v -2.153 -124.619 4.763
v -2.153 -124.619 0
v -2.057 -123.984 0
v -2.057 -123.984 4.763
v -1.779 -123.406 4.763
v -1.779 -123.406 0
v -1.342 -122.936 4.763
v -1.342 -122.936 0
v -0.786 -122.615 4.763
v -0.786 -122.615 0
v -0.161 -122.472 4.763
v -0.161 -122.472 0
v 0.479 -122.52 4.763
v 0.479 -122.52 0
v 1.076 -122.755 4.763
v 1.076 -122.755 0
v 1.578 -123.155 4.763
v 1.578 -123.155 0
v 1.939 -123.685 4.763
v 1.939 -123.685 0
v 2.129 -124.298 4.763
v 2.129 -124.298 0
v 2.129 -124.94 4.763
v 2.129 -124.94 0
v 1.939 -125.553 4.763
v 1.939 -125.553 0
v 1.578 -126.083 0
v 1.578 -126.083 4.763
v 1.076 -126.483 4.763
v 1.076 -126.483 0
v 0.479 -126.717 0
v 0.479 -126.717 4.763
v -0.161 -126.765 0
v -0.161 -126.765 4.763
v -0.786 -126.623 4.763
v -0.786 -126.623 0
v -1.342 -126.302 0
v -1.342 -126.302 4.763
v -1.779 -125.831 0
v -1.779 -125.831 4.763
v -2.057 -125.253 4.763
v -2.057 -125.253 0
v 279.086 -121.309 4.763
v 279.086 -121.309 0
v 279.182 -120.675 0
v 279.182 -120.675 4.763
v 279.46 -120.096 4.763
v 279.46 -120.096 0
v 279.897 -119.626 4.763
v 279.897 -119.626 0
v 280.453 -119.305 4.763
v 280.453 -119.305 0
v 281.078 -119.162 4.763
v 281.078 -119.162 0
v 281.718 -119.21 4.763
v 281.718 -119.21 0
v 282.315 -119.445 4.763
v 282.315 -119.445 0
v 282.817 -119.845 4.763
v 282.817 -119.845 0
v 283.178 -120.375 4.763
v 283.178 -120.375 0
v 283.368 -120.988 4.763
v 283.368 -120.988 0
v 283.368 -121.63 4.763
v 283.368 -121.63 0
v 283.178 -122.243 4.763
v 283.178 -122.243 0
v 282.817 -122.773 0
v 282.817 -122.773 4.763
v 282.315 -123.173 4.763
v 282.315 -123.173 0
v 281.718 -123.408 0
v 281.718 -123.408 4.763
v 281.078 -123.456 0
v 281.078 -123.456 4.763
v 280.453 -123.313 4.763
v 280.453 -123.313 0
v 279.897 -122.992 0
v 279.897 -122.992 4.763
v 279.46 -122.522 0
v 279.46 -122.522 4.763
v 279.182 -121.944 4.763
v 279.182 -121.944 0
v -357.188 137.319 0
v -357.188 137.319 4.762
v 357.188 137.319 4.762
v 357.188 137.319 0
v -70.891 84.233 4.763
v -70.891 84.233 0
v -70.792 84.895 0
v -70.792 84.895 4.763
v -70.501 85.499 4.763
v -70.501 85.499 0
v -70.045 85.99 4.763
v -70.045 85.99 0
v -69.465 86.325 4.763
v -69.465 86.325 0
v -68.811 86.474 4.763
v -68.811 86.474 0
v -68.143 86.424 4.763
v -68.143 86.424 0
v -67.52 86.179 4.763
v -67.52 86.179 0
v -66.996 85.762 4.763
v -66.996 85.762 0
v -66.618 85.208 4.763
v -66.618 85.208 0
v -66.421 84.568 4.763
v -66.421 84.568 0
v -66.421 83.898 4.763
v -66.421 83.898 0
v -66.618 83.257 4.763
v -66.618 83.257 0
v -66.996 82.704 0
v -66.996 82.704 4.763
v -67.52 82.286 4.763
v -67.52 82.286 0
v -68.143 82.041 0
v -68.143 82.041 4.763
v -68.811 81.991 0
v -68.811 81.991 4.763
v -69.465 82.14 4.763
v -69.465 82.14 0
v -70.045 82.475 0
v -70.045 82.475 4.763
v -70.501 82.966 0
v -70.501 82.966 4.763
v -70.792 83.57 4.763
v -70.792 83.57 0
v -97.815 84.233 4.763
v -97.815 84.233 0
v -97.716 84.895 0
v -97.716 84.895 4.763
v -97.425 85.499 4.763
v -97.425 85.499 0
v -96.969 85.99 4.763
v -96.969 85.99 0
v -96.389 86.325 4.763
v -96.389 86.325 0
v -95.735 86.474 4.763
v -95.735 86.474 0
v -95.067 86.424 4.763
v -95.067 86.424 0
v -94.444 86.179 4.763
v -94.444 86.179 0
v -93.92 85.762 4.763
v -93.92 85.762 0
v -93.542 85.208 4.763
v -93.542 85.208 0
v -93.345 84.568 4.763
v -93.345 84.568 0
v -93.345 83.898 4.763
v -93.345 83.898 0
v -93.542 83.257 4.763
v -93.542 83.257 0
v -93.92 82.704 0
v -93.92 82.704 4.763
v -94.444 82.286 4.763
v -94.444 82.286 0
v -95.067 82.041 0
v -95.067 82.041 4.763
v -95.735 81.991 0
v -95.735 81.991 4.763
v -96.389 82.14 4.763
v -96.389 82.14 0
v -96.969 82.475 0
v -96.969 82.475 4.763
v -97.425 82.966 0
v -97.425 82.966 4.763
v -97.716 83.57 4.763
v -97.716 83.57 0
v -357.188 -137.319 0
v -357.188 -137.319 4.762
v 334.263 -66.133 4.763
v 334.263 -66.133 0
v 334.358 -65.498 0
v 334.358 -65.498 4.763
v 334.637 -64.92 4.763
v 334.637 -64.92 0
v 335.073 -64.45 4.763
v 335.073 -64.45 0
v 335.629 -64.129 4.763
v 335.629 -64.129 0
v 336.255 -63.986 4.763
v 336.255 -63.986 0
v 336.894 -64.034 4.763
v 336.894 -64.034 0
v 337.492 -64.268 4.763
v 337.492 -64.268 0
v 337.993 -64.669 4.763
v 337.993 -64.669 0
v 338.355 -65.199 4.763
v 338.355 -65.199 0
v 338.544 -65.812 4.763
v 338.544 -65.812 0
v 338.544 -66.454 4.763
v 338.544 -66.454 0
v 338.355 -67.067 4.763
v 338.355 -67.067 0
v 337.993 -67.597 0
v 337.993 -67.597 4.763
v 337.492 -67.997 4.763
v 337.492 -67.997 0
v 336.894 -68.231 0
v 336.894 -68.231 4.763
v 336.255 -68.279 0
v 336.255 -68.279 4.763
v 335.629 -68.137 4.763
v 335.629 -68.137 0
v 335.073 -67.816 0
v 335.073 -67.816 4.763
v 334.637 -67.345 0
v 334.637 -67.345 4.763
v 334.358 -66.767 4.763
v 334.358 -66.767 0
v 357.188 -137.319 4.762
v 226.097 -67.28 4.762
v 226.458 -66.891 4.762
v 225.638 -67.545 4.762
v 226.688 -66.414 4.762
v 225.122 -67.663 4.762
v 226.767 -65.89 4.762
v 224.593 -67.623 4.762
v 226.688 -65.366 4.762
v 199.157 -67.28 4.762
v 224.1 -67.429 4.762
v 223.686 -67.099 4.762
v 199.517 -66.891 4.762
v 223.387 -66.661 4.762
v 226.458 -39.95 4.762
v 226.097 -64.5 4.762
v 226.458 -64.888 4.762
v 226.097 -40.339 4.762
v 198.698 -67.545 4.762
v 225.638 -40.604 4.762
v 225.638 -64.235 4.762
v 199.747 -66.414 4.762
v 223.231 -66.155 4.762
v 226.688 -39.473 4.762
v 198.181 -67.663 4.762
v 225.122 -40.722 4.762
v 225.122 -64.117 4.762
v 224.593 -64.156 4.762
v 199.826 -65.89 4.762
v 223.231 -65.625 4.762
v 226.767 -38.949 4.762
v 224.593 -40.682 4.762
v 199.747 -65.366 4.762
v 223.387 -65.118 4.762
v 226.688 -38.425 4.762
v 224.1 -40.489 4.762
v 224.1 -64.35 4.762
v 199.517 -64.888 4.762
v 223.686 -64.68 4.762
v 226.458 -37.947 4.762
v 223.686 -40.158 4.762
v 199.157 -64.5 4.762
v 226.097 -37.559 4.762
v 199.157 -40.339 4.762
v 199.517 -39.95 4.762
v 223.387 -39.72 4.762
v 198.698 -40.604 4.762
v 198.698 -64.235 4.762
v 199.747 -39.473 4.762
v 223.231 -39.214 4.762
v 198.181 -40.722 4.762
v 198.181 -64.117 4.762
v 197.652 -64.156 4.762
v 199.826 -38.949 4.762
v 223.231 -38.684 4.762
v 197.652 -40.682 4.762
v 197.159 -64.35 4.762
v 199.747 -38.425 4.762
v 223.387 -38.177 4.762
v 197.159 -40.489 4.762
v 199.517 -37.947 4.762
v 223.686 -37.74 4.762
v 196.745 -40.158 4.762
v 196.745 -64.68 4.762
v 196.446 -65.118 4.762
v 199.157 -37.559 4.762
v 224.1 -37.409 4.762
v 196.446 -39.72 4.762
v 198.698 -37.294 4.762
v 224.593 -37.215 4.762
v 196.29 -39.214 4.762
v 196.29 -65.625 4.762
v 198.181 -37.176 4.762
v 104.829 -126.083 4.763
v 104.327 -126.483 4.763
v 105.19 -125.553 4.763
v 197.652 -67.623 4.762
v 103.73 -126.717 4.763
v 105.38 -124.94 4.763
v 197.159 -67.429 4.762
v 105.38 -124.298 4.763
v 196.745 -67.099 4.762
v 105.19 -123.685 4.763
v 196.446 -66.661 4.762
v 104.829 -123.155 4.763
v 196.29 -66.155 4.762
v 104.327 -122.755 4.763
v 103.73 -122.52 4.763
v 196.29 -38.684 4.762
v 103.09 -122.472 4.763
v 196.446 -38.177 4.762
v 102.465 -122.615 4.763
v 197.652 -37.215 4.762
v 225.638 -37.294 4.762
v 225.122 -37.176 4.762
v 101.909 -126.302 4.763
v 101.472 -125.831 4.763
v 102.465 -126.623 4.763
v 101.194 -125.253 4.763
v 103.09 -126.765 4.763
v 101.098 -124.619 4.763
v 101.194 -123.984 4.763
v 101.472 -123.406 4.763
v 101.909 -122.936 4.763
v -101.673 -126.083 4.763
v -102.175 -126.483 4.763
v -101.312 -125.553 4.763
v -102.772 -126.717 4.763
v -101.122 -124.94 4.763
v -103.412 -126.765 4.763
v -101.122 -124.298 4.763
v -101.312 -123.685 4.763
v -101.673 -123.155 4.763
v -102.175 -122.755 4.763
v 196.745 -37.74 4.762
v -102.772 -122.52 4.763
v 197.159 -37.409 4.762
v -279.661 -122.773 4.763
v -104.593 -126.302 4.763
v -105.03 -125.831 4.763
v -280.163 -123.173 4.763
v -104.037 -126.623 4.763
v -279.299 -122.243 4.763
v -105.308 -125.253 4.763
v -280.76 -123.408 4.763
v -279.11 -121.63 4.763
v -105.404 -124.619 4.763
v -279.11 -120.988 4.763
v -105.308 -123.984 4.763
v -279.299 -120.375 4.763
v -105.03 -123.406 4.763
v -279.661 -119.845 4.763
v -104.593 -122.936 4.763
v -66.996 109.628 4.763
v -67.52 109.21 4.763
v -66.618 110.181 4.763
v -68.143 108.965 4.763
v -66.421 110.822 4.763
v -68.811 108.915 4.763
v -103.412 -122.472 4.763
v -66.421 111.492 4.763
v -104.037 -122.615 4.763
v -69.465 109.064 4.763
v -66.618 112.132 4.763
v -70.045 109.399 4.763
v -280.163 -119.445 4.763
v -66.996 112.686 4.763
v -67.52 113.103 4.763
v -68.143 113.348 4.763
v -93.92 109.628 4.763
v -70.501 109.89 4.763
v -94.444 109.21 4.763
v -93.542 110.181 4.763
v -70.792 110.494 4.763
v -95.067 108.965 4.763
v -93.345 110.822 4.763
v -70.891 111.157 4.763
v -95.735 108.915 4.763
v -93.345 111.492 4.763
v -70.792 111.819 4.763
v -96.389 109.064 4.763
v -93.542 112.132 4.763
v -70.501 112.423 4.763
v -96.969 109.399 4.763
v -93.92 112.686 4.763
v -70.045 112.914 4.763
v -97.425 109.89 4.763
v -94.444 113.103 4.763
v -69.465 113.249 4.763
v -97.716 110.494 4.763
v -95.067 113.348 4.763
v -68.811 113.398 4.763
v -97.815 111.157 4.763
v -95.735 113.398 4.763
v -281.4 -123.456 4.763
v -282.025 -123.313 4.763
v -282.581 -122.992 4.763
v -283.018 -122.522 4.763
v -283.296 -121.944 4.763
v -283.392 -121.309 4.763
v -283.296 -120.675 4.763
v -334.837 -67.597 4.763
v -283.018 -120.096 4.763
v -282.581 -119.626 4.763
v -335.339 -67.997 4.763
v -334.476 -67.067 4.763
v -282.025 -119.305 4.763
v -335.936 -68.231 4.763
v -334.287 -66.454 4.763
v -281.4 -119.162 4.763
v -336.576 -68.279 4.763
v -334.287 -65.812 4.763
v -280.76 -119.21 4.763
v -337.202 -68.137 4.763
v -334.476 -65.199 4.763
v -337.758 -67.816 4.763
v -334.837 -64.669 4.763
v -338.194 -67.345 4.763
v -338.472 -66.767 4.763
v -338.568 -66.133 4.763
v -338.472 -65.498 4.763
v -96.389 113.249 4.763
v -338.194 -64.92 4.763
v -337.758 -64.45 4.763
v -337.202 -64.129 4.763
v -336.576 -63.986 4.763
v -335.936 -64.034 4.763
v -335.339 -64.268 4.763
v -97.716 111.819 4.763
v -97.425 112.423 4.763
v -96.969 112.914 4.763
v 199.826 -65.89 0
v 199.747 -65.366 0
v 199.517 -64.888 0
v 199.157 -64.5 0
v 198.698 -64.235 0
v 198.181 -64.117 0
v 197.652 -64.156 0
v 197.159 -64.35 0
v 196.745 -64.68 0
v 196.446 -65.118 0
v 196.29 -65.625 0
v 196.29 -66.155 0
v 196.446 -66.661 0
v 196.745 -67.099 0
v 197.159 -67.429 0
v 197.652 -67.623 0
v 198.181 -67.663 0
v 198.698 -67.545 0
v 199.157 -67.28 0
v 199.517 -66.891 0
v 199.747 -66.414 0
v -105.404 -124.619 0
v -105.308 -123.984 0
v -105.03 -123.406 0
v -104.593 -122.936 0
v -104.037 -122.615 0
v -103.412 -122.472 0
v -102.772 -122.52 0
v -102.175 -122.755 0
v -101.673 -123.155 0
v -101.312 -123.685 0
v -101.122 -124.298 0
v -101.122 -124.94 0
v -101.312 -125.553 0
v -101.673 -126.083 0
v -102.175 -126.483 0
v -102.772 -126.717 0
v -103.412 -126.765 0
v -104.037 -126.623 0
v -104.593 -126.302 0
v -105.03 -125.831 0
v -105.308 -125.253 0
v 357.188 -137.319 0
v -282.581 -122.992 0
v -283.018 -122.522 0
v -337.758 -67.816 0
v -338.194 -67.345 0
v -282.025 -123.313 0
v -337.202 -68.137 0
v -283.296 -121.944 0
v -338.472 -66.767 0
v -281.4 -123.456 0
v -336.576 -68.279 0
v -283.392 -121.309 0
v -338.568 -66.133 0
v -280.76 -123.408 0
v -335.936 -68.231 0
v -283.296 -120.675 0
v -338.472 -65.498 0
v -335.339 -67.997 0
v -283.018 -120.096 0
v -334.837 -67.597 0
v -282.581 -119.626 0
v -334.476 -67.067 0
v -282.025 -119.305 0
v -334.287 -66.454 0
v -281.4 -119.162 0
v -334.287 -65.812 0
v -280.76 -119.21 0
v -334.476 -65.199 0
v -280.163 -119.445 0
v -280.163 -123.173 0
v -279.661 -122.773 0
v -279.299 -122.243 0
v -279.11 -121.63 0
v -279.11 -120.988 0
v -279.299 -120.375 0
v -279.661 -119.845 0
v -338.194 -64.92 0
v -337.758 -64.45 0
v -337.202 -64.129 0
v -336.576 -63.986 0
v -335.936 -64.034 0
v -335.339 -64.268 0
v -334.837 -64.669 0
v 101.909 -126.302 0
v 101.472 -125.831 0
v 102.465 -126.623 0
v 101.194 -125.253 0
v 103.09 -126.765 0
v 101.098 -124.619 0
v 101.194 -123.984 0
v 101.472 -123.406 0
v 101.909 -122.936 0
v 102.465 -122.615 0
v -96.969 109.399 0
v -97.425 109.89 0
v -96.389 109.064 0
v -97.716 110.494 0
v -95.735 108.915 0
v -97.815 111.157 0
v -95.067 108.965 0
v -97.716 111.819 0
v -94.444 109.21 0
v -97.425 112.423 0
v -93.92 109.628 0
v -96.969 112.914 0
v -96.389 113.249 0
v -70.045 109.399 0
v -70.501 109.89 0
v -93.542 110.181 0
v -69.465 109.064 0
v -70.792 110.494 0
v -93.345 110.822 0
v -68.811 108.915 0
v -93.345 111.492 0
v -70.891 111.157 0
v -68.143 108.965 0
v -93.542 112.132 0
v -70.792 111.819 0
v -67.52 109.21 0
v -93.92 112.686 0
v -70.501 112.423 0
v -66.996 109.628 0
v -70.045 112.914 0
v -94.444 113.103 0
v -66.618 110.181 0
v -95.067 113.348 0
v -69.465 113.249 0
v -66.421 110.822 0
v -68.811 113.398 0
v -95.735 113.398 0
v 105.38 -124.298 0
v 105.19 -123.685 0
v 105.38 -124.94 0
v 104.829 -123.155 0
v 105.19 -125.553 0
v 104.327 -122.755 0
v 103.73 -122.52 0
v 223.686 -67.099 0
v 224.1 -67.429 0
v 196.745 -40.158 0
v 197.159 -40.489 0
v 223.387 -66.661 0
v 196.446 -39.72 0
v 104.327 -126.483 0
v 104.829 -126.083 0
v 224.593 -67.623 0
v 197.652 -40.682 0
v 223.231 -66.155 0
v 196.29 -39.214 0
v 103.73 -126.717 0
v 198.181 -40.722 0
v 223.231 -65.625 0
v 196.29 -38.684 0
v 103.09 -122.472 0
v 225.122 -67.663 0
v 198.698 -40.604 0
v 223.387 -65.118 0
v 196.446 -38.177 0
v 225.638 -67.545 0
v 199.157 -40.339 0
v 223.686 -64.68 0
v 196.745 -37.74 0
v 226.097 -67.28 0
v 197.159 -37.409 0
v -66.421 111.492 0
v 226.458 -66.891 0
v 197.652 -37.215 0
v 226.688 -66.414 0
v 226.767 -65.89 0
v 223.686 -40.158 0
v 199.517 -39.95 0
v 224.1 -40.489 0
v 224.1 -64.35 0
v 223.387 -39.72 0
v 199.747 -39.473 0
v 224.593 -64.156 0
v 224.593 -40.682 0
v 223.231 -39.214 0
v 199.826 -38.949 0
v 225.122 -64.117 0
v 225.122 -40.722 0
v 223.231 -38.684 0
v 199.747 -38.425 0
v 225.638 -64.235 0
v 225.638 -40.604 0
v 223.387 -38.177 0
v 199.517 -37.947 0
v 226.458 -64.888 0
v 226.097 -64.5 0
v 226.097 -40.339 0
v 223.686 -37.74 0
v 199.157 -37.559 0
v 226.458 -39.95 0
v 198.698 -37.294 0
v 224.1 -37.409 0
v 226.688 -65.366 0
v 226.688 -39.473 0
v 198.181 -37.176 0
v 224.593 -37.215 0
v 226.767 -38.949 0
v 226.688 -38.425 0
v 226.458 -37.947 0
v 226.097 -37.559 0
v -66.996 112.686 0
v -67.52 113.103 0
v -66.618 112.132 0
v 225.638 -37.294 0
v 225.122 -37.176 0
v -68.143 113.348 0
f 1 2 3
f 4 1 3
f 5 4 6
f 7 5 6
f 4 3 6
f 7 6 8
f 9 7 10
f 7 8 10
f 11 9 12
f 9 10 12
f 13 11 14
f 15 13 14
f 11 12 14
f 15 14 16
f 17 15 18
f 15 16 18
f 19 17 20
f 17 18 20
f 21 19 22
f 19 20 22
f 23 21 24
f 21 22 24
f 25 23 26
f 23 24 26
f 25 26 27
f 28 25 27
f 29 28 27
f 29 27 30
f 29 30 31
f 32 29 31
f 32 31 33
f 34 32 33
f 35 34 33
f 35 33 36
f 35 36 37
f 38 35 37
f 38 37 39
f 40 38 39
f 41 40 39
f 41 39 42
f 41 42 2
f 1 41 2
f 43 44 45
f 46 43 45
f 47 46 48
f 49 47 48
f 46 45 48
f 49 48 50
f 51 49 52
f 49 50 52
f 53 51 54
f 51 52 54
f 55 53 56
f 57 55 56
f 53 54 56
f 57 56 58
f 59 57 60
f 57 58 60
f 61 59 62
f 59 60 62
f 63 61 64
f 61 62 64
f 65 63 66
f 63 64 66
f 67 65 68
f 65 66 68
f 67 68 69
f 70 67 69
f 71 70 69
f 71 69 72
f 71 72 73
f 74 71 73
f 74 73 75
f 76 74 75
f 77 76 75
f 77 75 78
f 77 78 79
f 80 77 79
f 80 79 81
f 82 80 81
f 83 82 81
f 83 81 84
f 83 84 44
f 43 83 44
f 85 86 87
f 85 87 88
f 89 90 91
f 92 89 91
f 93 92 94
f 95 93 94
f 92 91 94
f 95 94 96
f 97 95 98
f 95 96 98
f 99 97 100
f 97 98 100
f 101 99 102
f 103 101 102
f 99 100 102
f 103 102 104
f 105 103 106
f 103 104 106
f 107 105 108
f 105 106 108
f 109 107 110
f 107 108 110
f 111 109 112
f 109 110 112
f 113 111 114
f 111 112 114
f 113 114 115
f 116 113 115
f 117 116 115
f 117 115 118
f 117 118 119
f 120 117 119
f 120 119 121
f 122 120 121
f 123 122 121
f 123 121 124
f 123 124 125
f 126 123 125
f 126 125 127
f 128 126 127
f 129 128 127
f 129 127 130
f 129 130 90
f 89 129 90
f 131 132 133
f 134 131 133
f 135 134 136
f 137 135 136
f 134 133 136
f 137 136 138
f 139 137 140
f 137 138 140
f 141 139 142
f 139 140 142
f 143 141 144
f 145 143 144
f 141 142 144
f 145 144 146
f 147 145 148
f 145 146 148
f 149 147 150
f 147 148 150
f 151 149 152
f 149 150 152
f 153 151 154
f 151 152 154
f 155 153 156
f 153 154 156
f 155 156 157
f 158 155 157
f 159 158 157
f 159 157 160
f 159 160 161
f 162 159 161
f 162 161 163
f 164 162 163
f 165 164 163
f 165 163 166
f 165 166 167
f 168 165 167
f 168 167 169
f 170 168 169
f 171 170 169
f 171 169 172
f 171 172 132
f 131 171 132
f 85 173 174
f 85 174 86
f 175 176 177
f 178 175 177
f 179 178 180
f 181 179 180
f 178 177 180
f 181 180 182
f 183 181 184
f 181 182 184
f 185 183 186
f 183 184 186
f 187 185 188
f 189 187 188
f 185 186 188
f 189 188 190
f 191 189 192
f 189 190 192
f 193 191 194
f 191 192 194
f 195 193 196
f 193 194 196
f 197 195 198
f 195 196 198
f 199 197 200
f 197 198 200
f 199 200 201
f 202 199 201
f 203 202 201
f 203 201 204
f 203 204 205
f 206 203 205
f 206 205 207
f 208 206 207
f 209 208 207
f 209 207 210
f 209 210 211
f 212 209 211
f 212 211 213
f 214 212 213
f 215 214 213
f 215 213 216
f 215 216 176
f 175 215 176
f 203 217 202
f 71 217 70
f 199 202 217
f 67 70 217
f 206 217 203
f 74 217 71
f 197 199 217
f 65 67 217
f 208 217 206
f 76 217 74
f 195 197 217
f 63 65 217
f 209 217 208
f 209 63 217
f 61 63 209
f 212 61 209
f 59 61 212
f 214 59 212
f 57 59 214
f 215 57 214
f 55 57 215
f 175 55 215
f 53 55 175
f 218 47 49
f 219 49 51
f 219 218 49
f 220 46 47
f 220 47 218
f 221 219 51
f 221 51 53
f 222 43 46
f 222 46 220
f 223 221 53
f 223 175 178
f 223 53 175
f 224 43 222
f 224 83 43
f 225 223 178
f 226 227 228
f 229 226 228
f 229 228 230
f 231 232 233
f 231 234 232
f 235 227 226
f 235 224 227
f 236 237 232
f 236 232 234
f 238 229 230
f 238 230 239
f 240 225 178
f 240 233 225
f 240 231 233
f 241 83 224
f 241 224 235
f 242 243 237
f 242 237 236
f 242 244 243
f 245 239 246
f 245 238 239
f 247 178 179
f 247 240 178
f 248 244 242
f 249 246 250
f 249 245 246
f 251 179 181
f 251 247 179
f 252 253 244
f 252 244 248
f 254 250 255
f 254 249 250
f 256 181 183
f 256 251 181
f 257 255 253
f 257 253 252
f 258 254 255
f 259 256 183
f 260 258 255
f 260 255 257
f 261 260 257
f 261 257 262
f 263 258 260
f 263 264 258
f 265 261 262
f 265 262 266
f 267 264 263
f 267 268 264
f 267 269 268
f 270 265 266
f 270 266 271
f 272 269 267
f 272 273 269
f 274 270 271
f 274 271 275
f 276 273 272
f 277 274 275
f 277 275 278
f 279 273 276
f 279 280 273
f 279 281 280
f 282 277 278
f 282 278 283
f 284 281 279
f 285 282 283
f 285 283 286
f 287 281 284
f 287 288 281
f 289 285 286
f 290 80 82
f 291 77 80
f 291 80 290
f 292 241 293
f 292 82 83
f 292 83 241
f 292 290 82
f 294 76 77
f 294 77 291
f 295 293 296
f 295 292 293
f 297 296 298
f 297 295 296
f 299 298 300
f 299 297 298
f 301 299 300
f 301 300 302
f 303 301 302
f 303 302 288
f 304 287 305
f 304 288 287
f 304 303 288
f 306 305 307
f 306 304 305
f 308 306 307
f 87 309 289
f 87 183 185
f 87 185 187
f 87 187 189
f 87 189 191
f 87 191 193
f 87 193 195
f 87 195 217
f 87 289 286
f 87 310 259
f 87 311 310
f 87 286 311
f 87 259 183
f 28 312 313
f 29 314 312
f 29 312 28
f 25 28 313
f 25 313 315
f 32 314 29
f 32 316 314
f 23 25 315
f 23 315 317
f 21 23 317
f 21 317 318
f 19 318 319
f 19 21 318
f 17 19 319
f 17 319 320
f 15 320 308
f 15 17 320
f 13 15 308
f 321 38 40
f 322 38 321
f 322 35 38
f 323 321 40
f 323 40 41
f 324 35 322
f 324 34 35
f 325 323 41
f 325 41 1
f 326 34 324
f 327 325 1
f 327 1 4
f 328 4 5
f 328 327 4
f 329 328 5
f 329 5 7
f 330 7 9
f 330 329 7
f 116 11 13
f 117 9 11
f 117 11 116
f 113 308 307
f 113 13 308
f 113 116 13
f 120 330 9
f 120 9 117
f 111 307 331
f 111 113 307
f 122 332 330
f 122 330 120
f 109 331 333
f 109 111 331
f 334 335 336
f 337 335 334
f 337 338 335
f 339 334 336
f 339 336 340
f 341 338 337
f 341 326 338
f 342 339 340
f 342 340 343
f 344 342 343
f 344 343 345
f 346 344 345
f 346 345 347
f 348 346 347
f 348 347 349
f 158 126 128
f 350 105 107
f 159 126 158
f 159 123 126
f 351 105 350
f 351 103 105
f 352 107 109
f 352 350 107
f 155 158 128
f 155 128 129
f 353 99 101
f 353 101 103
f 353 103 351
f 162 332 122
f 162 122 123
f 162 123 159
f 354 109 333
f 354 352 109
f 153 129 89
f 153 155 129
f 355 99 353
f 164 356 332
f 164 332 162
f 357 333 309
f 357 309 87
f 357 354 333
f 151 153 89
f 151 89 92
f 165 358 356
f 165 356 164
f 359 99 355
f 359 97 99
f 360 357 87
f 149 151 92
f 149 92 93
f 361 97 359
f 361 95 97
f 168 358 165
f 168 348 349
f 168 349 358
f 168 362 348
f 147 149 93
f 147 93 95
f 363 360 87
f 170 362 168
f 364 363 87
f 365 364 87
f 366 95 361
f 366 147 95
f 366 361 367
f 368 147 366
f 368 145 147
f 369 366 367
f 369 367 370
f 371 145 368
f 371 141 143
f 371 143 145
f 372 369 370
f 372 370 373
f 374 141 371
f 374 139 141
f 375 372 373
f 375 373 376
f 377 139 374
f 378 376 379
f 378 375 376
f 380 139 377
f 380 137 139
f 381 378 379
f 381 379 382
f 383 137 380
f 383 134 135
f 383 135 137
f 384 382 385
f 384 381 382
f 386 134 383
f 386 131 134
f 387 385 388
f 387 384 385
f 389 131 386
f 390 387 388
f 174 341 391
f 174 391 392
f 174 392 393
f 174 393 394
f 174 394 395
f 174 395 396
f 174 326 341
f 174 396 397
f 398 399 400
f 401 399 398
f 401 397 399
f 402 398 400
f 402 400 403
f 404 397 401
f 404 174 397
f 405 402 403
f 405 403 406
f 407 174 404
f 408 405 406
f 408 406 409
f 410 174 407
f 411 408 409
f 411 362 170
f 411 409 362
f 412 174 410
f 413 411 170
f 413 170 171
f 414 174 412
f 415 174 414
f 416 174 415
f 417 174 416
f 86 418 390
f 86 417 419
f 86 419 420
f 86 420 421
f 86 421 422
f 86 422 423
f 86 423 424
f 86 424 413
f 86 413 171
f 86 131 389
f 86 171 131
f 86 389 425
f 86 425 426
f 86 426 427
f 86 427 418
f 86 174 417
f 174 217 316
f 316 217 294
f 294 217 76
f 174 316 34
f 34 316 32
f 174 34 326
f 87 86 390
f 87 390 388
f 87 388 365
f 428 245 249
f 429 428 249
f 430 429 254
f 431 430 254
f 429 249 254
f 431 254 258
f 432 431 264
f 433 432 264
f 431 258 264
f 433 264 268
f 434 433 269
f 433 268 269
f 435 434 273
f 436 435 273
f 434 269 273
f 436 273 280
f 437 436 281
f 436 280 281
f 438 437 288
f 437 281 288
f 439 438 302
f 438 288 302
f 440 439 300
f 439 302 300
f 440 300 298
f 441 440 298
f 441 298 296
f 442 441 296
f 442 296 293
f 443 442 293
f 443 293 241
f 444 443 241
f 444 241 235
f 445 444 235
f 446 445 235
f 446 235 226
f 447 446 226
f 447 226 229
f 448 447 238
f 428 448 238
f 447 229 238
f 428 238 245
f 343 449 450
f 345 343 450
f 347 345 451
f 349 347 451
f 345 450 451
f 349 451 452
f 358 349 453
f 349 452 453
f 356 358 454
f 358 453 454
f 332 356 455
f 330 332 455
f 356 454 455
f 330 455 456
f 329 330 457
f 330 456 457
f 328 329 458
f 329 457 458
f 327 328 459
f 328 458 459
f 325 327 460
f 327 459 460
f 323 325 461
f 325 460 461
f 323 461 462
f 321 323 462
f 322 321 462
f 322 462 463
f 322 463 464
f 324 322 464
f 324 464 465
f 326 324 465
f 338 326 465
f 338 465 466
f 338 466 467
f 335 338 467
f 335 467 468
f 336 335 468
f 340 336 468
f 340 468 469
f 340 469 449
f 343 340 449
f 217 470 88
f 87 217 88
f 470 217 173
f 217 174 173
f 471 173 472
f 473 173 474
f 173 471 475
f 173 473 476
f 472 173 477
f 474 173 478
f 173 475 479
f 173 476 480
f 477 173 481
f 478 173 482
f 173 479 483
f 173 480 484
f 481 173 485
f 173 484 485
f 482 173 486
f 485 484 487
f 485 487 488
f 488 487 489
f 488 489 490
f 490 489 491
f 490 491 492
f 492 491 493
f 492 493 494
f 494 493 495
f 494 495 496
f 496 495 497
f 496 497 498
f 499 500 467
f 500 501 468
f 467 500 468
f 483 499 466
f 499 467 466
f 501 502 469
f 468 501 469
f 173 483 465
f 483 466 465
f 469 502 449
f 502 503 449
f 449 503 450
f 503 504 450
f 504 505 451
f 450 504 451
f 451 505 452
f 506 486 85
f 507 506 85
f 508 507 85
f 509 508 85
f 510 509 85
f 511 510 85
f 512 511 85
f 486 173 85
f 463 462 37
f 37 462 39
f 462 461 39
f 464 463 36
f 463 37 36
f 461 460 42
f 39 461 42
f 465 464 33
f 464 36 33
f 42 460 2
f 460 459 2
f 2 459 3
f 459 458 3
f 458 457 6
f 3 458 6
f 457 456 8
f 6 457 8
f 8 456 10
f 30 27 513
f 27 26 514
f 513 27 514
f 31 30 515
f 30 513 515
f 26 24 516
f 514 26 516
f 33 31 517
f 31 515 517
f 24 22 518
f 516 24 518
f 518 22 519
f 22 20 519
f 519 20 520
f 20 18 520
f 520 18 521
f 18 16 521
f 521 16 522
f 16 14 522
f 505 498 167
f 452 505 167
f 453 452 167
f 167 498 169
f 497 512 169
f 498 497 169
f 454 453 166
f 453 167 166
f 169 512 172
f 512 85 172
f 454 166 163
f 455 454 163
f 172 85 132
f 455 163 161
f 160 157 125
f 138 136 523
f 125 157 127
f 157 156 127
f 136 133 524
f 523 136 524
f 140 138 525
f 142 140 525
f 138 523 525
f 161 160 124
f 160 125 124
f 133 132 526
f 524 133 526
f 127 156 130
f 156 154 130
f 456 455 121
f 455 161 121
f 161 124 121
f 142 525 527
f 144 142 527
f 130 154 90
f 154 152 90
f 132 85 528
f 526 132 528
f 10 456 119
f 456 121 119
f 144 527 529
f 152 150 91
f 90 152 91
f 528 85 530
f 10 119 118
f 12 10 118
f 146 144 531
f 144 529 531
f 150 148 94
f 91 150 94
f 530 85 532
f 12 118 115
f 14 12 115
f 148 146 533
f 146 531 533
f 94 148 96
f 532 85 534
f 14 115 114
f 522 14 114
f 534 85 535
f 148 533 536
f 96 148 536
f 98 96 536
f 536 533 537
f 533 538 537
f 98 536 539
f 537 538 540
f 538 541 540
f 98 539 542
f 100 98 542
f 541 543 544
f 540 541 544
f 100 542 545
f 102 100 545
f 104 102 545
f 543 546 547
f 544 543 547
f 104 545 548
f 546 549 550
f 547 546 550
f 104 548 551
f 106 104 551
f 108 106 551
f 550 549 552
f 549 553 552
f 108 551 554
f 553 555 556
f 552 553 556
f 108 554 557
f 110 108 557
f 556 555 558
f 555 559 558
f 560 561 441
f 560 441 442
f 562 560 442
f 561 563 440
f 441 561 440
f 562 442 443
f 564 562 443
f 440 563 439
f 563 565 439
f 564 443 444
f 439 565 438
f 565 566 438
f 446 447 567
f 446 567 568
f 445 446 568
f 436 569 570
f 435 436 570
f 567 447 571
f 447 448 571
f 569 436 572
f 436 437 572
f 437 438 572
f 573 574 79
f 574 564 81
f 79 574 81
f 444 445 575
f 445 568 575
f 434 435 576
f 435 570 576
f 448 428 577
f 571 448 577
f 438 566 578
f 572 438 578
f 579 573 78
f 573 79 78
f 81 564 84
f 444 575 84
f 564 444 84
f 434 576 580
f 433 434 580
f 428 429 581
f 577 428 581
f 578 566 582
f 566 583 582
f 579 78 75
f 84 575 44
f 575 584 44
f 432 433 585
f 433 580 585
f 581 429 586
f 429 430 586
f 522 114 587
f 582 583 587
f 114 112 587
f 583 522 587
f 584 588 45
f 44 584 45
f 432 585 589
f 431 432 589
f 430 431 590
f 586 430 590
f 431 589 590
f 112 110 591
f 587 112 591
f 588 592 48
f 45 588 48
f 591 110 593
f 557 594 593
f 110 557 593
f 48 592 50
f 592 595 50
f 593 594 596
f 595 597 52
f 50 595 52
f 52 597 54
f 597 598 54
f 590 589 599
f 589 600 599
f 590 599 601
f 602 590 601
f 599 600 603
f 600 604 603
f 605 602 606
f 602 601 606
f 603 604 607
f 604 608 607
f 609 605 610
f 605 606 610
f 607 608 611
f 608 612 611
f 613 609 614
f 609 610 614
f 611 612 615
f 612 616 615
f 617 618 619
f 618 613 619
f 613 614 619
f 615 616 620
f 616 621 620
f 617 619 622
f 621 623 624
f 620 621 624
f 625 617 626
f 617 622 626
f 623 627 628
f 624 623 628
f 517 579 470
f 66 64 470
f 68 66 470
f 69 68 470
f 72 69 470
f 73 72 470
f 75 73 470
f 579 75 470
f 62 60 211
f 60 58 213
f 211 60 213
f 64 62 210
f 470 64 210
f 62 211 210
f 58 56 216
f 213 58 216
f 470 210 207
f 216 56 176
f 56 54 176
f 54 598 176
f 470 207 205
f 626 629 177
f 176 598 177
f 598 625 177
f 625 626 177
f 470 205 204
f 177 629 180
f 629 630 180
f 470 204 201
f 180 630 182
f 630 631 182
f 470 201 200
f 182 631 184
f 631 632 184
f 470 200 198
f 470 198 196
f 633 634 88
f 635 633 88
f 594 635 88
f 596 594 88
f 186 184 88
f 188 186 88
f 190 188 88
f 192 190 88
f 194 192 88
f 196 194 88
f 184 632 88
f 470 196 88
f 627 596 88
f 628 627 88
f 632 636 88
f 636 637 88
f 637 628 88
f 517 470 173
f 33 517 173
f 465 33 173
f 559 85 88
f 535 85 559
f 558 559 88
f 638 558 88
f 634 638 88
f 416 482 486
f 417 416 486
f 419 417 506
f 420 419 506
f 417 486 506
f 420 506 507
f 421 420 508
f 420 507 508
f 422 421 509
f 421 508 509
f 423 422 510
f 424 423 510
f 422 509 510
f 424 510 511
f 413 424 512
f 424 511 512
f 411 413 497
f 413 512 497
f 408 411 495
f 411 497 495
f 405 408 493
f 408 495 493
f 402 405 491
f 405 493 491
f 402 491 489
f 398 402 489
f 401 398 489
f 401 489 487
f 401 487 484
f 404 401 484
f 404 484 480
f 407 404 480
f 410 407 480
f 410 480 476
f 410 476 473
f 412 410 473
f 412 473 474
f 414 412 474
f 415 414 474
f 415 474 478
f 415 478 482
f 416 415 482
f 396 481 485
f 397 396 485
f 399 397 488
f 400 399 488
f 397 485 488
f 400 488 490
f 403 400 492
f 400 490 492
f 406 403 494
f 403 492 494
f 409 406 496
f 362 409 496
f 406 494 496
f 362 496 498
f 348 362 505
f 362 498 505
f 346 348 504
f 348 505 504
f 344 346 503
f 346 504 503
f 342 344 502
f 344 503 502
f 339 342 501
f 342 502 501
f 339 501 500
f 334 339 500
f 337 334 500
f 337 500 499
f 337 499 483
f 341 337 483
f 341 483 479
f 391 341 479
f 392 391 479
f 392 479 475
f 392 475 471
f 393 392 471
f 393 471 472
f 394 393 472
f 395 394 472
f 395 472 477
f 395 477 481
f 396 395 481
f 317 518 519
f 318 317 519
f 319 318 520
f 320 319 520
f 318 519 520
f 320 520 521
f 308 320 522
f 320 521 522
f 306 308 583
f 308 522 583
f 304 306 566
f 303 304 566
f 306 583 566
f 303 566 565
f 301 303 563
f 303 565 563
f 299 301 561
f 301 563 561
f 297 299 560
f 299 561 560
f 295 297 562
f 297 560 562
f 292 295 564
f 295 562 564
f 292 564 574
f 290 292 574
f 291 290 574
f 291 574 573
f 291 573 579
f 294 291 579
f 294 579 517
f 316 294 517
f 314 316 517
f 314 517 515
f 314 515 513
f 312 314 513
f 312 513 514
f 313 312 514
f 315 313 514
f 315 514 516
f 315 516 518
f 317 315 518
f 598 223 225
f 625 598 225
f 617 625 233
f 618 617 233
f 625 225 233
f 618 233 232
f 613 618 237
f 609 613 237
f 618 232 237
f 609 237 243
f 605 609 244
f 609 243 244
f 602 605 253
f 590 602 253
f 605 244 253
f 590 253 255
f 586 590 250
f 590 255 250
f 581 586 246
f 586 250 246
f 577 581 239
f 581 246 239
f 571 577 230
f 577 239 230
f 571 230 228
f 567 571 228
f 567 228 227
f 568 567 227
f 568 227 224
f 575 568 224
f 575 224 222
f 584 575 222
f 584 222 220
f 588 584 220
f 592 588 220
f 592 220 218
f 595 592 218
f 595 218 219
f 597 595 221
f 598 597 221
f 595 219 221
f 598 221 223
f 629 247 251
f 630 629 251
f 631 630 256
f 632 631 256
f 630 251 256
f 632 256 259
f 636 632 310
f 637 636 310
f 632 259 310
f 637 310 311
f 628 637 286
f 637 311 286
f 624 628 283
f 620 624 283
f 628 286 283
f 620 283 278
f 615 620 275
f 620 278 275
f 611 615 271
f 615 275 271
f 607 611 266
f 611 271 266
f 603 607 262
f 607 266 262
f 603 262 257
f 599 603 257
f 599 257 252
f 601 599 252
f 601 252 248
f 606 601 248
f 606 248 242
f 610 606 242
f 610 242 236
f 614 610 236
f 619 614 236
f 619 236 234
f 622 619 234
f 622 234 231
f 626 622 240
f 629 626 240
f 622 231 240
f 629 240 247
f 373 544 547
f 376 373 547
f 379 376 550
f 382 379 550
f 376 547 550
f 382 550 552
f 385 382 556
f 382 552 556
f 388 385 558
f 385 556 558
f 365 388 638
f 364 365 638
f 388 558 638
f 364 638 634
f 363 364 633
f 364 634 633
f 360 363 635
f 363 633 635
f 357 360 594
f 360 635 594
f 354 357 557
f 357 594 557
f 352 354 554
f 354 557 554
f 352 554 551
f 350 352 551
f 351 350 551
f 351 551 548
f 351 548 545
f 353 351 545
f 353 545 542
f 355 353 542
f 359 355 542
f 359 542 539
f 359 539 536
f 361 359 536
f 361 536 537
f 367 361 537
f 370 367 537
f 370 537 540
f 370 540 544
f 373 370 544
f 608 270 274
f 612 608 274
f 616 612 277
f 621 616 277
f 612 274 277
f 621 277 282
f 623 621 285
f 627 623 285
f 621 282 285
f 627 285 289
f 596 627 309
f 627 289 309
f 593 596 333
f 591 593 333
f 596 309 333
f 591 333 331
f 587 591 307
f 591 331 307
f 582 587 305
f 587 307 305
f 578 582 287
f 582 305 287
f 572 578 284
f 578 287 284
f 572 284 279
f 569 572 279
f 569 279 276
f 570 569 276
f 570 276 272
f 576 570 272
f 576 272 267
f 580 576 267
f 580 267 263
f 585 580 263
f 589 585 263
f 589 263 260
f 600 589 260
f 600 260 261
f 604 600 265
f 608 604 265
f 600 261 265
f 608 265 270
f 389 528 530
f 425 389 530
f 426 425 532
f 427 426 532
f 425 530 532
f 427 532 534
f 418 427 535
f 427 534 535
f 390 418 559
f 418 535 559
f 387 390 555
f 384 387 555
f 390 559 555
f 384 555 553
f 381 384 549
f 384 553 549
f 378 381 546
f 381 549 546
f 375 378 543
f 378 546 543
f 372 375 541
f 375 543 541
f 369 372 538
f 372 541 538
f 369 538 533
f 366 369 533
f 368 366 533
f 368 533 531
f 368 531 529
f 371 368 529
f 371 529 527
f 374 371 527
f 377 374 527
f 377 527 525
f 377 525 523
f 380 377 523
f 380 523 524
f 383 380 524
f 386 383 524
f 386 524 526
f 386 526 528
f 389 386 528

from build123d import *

# Parameters (mm, degrees)
SKETCH1_W                 = 714.375
SKETCH1_H                 = 274.6375
BOSS_EXTRUDE1_DEPTH       = 4.7625
CUT_EXTRUDE1_DEPTH        = 5.7625
CUT_EXTRUDE3_DEPTH        = 5.7625
CUT_EXTRUDE4_REACH        = 6.763
SKETCH5_R                 = 2.15265
BOSS_EXTRUDE2_START       = -692.15
SKETCH7_W                 = 4.7625
SKETCH7_H                 = 274.6375
BOSS_EXTRUDE2_DEPTH       = 669.925
F_8_CLEARANCE_HOLE1_D     = 4.3053
F_8_CLEARANCE_HOLE1_DEPTH = 74.422
F_8_CLEARANCE_HOLE1_TIP   = 1.293442612
F_8_CLEARANCE_HOLE2_D     = 4.3053
F_8_CLEARANCE_HOLE2_DEPTH = 74.422
F_8_CLEARANCE_HOLE2_TIP   = 1.293442612
F_8_CLEARANCE_HOLE3_D     = 4.4958
F_8_CLEARANCE_HOLE3_DEPTH = 74.422
F_8_CLEARANCE_HOLE3_TIP   = 1.350674586
SKETCH16_R                = 1.778
CUT_EXTRUDE5_DEPTH        = 4.7625


with BuildPart() as part:
    # Sketch1 → Boss-Extrude1 (new body)
    with BuildSketch(Plane.XY):
        Rectangle(SKETCH1_W, SKETCH1_H)
    extrude(amount=BOSS_EXTRUDE1_DEPTH)

    # Sketch2 → Cut-Extrude1 (cut, through all)
    with BuildSketch(Plane.XY.offset(4.7625)):
        with BuildLine():
            Line((12.285980323, -89.570459076), (10.351389114, -91.505050285))
            ThreePointArc((10.351389114, -91.505050285), (0, -88.10625), (-10.351389114, -91.505050285))
            Line((-10.351389114, -91.505050285), (-12.285980323, -89.570459076))
            ThreePointArc((-12.285980323, -89.570459076), (-15.998290924, -89.570459076), (-15.998290924, -93.282769677))
            Line((-15.998290924, -93.282769677), (-14.063699715, -95.217360886))
            ThreePointArc((-14.063699715, -95.217360886), (-17.4625, -105.56875), (-14.063699715, -115.920139114))
            Line((-14.063699715, -115.920139114), (-15.998290924, -117.854730323))
            ThreePointArc((-15.998290924, -117.854730323), (-15.998290924, -121.567040924), (-12.285980323, -121.567040924))
            Line((-12.285980323, -121.567040924), (-10.351389114, -119.632449715))
            ThreePointArc((-10.351389114, -119.632449715), (0, -123.03125), (10.351389114, -119.632449715))
            Line((10.351389114, -119.632449715), (12.285980323, -121.567040924))
            ThreePointArc((12.285980323, -121.567040924), (15.998290924, -121.567040924), (15.998290924, -117.854730323))
            Line((15.998290924, -117.854730323), (14.063699715, -115.920139114))
            ThreePointArc((14.063699715, -115.920139114), (17.4625, -105.56875), (14.063699715, -95.217360886))
            Line((14.063699715, -95.217360886), (15.998290924, -93.282769677))
            ThreePointArc((15.998290924, -93.282769677), (15.998290924, -89.570459076), (12.285980323, -89.570459076))
        make_face()
        with BuildLine():
            Line((-305.214019677, -89.570459076), (-307.148610886, -91.505050285))
            ThreePointArc((-307.148610886, -91.505050285), (-317.5, -88.10625), (-327.851389114, -91.505050285))
            Line((-327.851389114, -91.505050285), (-329.785980323, -89.570459076))
            ThreePointArc((-329.785980323, -89.570459076), (-333.498290924, -89.570459076), (-333.498290924, -93.282769677))
            Line((-333.498290924, -93.282769677), (-331.563699715, -95.217360886))
            ThreePointArc((-331.563699715, -95.217360886), (-334.9625, -105.56875), (-331.563699715, -115.920139114))
            Line((-331.563699715, -115.920139114), (-333.498290924, -117.854730323))
            ThreePointArc((-333.498290924, -117.854730323), (-333.498290924, -121.567040924), (-329.785980323, -121.567040924))
            Line((-329.785980323, -121.567040924), (-327.851389114, -119.632449715))
            ThreePointArc((-327.851389114, -119.632449715), (-317.5, -123.03125), (-307.148610886, -119.632449715))
            Line((-307.148610886, -119.632449715), (-305.214019677, -121.567040924))
            ThreePointArc((-305.214019677, -121.567040924), (-301.501709076, -121.567040924), (-301.501709076, -117.854730323))
            Line((-301.501709076, -117.854730323), (-303.436300285, -115.920139114))
            ThreePointArc((-303.436300285, -115.920139114), (-300.0375, -105.56875), (-303.436300285, -95.217360886))
            Line((-303.436300285, -95.217360886), (-301.501709076, -93.282769677))
            ThreePointArc((-301.501709076, -93.282769677), (-301.501709076, -89.570459076), (-305.214019677, -89.570459076))
        make_face()
        with BuildLine():
            Line((329.785980323, -89.570459076), (327.851389114, -91.505050285))
            ThreePointArc((327.851389114, -91.505050285), (317.5, -88.10625), (307.148610886, -91.505050285))
            Line((307.148610886, -91.505050285), (305.214019677, -89.570459076))
            ThreePointArc((305.214019677, -89.570459076), (301.501709076, -89.570459076), (301.501709076, -93.282769677))
            Line((301.501709076, -93.282769677), (303.436300285, -95.217360886))
            ThreePointArc((303.436300285, -95.217360886), (300.0375, -105.56875), (303.436300285, -115.920139114))
            Line((303.436300285, -115.920139114), (301.501709076, -117.854730323))
            ThreePointArc((301.501709076, -117.854730323), (301.501709076, -121.567040924), (305.214019677, -121.567040924))
            Line((305.214019677, -121.567040924), (307.148610886, -119.632449715))
            ThreePointArc((307.148610886, -119.632449715), (317.5, -123.03125), (327.851389114, -119.632449715))
            Line((327.851389114, -119.632449715), (329.785980323, -121.567040924))
            ThreePointArc((329.785980323, -121.567040924), (333.498290924, -121.567040924), (333.498290924, -117.854730323))
            Line((333.498290924, -117.854730323), (331.563699715, -115.920139114))
            ThreePointArc((331.563699715, -115.920139114), (334.9625, -105.56875), (331.563699715, -95.217360886))
            Line((331.563699715, -95.217360886), (333.498290924, -93.282769677))
            ThreePointArc((333.498290924, -93.282769677), (333.498290924, -89.570459076), (329.785980323, -89.570459076))
        make_face()
    extrude(amount=-CUT_EXTRUDE1_DEPTH, mode=Mode.SUBTRACT)

    # Sketch4 → Cut-Extrude3 (cut, through all)
    with BuildSketch(Plane.XY.offset(4.7625)):
        with BuildLine():
            Line((277.1521, 88.42375), (277.1521, 97.31375))
            ThreePointArc((277.1521, 97.31375), (279.4, 99.56165), (281.6479, 97.31375))
            Line((281.6479, 97.31375), (281.6479, 88.42375))
            ThreePointArc((281.6479, 88.42375), (279.4, 86.17585), (277.1521, 88.42375))
        make_face()
        with BuildLine():
            Line((-277.1521, 88.42375), (-277.1521, 97.31375))
            ThreePointArc((-277.1521, 97.31375), (-279.4, 99.56165), (-281.6479, 97.31375))
            Line((-281.6479, 97.31375), (-281.6479, 88.42375))
            ThreePointArc((-281.6479, 88.42375), (-279.4, 86.17585), (-277.1521, 88.42375))
        make_face()
    extrude(amount=-CUT_EXTRUDE3_DEPTH, mode=Mode.SUBTRACT)

    # Sketch5 → Cut-Extrude4 (cut, up to next)
    with BuildSketch(Plane.XY.offset(4.7625), mode=Mode.PRIVATE) as cut_extrude4_sk1:
        with Locations((-127, -105.56875)):
            Circle(SKETCH5_R)
    cut_extrude4_tool1 = extrude(cut_extrude4_sk1.sketch, amount=-CUT_EXTRUDE4_REACH, mode=Mode.PRIVATE) & part.part
    add(cut_extrude4_tool1.solids().sort_by_distance((-127, -105.56875, 4.7625))[0], mode=Mode.SUBTRACT)
    # Sketch5 → Cut-Extrude4 (cut, up to next)
    with BuildSketch(Plane.XY.offset(4.7625), mode=Mode.PRIVATE) as cut_extrude4_sk2:
        with Locations((-215.9, -105.56875)):
            Circle(SKETCH5_R)
    cut_extrude4_tool2 = extrude(cut_extrude4_sk2.sketch, amount=-CUT_EXTRUDE4_REACH, mode=Mode.PRIVATE) & part.part
    add(cut_extrude4_tool2.solids().sort_by_distance((-215.9, -105.56875, 4.7625))[0], mode=Mode.SUBTRACT)
    # Sketch5 → Cut-Extrude4 (cut, up to next)
    with BuildSketch(Plane.XY.offset(4.7625), mode=Mode.PRIVATE) as cut_extrude4_sk3:
        with Locations((215.9, -105.56875)):
            Circle(SKETCH5_R)
    cut_extrude4_tool3 = extrude(cut_extrude4_sk3.sketch, amount=-CUT_EXTRUDE4_REACH, mode=Mode.PRIVATE) & part.part
    add(cut_extrude4_tool3.solids().sort_by_distance((215.9, -105.56875, 4.7625))[0], mode=Mode.SUBTRACT)
    # Sketch5 → Cut-Extrude4 (cut, up to next)
    with BuildSketch(Plane.XY.offset(4.7625), mode=Mode.PRIVATE) as cut_extrude4_sk4:
        with Locations((127, -105.56875)):
            Circle(SKETCH5_R)
    cut_extrude4_tool4 = extrude(cut_extrude4_sk4.sketch, amount=-CUT_EXTRUDE4_REACH, mode=Mode.PRIVATE) & part.part
    add(cut_extrude4_tool4.solids().sort_by_distance((127, -105.56875, 4.7625))[0], mode=Mode.SUBTRACT)

    # Sketch7 → Boss-Extrude2 (add)
    with BuildSketch(Plane(origin=(357.1875, 0, 0), x_dir=(0, 0, -1), z_dir=(1, 0, 0)).offset(BOSS_EXTRUDE2_START)):
        with Locations((-2.38125, 0)):
            Rectangle(SKETCH7_W, SKETCH7_H)
    extrude(amount=BOSS_EXTRUDE2_DEPTH)

    # #8 Clearance Hole1
    with Locations(Plane.XY.offset(4.7625)):
        with Locations((-336.41538, -66.13271), (-281.23896, -121.30913), (281.23896, -121.30913), (336.41538, -66.13271)):
            Hole(F_8_CLEARANCE_HOLE1_D / 2, depth=F_8_CLEARANCE_HOLE1_DEPTH)
            with Locations((0, 0, -(F_8_CLEARANCE_HOLE1_DEPTH + F_8_CLEARANCE_HOLE1_TIP / 2))):  # 118° drill point
                Cone(0, F_8_CLEARANCE_HOLE1_D / 2, F_8_CLEARANCE_HOLE1_TIP, mode=Mode.SUBTRACT)

    # #8 Clearance Hole2
    with Locations(Plane.XY.offset(4.7625)):
        with Locations((-103.251, -124.61875), (0, -124.61875), (103.251, -124.61875)):
            Hole(F_8_CLEARANCE_HOLE2_D / 2, depth=F_8_CLEARANCE_HOLE2_DEPTH)
            with Locations((0, 0, -(F_8_CLEARANCE_HOLE2_DEPTH + F_8_CLEARANCE_HOLE2_TIP / 2))):  # 118° drill point
                Cone(0, F_8_CLEARANCE_HOLE2_D / 2, F_8_CLEARANCE_HOLE2_TIP, mode=Mode.SUBTRACT)

    # #8 Clearance Hole3
    with Locations(Plane.XY.offset(4.7625)):
        with Locations((-95.5675, 111.15675), (-68.6435, 111.15675), (-95.5675, 84.23275), (-68.6435, 84.23275)):
            Hole(F_8_CLEARANCE_HOLE3_D / 2, depth=F_8_CLEARANCE_HOLE3_DEPTH)
            with Locations((0, 0, -(F_8_CLEARANCE_HOLE3_DEPTH + F_8_CLEARANCE_HOLE3_TIP / 2))):  # 118° drill point
                Cone(0, F_8_CLEARANCE_HOLE3_D / 2, F_8_CLEARANCE_HOLE3_TIP, mode=Mode.SUBTRACT)

    # Sketch16 → Cut-Extrude5 (cut)
    with BuildSketch(Plane.XY.offset(4.7625)):
        with Locations((198.048115818, -38.948865818)):
            Circle(SKETCH16_R)
        with Locations((224.988884182, -38.948865818)):
            Circle(SKETCH16_R)
        with Locations((224.988884182, -65.889634182)):
            Circle(SKETCH16_R)
        with Locations((198.048115818, -65.889634182)):
            Circle(SKETCH16_R)
    extrude(amount=-CUT_EXTRUDE5_DEPTH, mode=Mode.SUBTRACT)


solid = part.part
